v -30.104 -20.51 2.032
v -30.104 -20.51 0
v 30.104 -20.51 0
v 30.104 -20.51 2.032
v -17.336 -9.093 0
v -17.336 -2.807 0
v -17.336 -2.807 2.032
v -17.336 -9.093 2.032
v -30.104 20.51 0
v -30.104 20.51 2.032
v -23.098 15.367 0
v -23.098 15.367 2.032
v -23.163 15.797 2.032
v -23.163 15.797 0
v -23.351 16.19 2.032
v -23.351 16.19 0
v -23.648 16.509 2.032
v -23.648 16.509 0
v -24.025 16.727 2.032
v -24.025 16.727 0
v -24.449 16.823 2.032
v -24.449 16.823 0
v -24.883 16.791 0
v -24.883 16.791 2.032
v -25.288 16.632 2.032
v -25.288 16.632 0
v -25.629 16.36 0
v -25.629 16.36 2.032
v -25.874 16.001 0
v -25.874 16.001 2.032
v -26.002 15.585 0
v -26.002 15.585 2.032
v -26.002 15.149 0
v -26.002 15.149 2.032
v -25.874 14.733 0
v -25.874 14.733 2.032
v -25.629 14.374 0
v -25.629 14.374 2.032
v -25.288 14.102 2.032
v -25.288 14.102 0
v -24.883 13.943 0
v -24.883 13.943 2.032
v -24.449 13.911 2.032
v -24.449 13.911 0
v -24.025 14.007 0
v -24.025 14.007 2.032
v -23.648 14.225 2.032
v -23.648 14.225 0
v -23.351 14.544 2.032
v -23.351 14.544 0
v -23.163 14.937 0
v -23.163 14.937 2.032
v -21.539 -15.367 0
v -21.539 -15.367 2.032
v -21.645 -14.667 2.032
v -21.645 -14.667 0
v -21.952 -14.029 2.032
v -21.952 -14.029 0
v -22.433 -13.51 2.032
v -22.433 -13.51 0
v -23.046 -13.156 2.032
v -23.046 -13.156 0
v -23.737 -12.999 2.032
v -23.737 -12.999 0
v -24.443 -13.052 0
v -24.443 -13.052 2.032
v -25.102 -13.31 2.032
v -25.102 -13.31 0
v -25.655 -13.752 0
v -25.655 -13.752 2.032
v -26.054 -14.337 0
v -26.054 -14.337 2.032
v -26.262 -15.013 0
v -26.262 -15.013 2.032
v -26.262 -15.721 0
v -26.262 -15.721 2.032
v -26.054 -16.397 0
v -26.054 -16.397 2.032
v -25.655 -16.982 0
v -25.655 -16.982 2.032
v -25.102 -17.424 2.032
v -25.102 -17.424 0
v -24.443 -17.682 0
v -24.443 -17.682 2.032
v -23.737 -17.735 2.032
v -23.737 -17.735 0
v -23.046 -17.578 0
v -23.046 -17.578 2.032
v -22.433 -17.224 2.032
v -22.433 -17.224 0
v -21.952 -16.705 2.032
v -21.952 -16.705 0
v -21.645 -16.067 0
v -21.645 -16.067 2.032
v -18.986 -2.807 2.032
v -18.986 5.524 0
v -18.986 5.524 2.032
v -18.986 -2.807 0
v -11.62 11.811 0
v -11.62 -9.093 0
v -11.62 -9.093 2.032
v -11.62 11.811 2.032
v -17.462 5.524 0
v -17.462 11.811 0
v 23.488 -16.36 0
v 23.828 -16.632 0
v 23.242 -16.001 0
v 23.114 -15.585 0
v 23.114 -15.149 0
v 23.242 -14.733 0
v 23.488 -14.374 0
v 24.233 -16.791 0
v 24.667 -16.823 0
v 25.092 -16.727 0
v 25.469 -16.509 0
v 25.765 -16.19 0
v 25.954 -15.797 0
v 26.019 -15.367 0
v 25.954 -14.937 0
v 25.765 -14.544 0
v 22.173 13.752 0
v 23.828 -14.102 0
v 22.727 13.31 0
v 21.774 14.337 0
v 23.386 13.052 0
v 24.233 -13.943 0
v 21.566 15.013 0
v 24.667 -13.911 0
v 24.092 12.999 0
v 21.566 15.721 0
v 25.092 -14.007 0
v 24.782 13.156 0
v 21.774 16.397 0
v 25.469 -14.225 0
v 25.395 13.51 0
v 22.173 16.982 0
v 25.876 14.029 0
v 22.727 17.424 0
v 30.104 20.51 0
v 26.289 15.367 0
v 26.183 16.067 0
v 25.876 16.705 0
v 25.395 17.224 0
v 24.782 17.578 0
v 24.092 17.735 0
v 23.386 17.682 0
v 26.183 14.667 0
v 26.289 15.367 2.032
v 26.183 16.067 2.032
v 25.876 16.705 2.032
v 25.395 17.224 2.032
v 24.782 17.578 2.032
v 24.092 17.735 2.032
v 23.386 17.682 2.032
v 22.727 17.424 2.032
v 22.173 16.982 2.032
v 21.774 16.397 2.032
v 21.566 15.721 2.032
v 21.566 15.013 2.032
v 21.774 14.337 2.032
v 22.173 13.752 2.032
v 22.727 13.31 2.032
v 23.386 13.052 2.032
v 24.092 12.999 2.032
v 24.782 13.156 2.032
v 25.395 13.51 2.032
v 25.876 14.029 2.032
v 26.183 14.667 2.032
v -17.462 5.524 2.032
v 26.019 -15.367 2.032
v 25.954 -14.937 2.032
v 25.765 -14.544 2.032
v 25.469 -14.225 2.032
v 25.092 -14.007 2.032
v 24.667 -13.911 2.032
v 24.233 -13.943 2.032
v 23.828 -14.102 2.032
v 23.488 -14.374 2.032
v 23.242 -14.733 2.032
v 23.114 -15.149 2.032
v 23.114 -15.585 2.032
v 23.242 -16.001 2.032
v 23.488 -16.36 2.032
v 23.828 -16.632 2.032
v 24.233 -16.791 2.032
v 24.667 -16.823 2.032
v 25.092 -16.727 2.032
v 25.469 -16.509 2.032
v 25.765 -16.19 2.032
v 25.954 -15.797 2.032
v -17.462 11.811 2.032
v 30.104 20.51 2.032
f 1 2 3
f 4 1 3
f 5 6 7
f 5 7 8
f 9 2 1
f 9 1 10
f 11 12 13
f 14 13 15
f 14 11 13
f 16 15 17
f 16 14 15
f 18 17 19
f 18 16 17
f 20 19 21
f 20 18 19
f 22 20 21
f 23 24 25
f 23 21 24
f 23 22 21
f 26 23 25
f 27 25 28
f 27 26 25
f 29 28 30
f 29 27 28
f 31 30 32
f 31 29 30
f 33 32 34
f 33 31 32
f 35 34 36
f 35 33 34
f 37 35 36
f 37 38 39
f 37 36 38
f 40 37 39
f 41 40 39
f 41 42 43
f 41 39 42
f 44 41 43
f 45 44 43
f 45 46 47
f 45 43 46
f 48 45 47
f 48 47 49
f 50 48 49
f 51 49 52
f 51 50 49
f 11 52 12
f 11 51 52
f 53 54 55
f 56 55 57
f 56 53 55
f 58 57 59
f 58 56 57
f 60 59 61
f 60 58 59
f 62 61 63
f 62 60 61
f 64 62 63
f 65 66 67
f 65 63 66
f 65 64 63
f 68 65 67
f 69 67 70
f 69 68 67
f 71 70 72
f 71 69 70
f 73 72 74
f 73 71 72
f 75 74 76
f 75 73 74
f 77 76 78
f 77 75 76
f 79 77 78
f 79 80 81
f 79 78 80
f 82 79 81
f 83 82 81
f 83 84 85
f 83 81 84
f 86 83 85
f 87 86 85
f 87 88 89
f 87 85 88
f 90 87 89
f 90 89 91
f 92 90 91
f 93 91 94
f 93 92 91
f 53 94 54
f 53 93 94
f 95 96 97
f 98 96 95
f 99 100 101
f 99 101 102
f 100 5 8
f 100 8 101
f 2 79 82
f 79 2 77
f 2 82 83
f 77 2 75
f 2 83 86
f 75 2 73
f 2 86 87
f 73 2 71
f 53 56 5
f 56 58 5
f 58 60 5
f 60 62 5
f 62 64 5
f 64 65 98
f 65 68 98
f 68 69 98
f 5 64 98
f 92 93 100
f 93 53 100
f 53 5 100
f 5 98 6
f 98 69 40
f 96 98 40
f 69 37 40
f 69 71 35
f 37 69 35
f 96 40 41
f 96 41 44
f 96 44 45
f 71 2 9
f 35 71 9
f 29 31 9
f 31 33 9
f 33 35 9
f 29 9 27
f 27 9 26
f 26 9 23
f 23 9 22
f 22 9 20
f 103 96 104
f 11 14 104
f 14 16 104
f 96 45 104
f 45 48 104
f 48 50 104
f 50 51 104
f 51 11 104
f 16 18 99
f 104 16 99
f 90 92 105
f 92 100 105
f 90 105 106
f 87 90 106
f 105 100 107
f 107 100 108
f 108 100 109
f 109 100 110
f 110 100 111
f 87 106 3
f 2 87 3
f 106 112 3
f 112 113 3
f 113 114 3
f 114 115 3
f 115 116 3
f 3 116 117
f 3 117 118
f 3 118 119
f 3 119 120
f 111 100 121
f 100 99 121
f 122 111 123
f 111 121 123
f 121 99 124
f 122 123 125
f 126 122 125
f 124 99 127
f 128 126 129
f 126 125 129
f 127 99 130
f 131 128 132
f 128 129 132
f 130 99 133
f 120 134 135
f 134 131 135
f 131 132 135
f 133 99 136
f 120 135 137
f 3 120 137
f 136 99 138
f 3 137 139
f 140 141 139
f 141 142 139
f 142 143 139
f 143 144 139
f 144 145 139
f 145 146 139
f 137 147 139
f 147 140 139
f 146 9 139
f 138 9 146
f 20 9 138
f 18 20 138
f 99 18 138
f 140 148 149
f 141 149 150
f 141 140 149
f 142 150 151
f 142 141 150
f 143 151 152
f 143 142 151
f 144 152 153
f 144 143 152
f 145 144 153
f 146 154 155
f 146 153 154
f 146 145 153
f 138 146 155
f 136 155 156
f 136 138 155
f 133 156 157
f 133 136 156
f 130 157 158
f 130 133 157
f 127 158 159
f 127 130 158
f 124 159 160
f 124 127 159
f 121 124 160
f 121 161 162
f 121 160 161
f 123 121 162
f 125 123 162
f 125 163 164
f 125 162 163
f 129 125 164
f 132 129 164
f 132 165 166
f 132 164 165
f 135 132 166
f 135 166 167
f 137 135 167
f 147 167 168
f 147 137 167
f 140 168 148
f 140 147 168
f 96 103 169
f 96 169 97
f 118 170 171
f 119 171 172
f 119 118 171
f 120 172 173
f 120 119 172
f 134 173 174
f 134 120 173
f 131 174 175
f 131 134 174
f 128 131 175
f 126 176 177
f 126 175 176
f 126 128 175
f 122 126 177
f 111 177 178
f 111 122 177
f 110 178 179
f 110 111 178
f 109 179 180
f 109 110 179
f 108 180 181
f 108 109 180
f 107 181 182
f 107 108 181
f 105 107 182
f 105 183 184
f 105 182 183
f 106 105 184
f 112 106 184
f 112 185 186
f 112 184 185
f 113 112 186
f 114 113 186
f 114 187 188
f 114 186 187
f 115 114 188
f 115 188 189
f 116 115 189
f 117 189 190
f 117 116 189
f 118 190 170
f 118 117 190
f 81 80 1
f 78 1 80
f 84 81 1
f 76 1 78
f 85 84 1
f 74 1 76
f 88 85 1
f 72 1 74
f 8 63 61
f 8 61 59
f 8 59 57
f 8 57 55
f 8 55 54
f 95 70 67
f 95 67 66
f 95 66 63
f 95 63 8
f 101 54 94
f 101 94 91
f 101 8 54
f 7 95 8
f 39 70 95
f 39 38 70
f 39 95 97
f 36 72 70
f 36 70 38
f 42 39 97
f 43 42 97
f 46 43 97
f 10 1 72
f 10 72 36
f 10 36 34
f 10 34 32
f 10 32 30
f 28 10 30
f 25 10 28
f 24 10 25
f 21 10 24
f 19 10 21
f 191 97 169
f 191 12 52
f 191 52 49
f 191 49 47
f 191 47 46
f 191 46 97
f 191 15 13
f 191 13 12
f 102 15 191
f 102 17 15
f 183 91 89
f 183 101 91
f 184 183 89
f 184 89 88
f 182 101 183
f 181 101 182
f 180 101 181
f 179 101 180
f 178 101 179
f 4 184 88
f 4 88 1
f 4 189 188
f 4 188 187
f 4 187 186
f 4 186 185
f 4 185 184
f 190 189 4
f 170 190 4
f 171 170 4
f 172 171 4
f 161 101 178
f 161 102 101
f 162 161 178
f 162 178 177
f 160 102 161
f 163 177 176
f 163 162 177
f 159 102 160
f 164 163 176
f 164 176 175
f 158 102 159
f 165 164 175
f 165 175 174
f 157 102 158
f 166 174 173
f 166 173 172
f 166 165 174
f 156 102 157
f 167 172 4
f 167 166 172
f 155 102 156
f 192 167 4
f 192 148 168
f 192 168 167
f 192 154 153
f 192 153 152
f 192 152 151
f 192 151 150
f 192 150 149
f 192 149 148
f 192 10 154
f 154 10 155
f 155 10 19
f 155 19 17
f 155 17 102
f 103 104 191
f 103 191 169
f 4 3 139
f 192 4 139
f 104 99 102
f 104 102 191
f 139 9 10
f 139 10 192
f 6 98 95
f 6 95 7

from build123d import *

# Parameters (mm, degrees)
F8_W      = 60.2088514067
F8_H      = 41.021
F9_DEPTH  = 2.032
F6_R      = 2.3749
F7_R      = 2.3749
F10_DEPTH = 12.192
F3_R      = 1.4605
F5_R      = 1.4605
F11_DEPTH = 12.192
F13_DEPTH = 2.286


with BuildPart() as f9:
    # F8 (on Top) → F9 (new body)
    with BuildSketch(Plane.XY):
        Rectangle(F8_W, F8_H)
    extrude(amount=F9_DEPTH)

    # F6 (on face) + F7 (on face) → F10 (cut)
    with BuildSketch(Plane.XY):
        with Locations((-23.9141, -15.367)):
            Circle(F6_R)
    with BuildSketch(Plane.XY):
        with Locations((23.9141, 15.367)):
            Circle(F7_R)
    extrude(amount=F10_DEPTH, mode=Mode.SUBTRACT)

    # F3 (on face) + F5 (on face) → F11 (cut)
    with BuildSketch(Plane.XY):
        with Locations((-24.5581628517, 15.367)):
            Circle(F3_R)
    with BuildSketch(Plane.XY):
        with Locations((24.5581628517, -15.367)):
            Circle(F5_R)
    extrude(amount=F11_DEPTH, mode=Mode.SUBTRACT)

    # F12 (on Top) → F13 (cut)
    with BuildSketch(Plane.XY):
        Polygon((-11.6205, -9.0932), (-11.6205, 11.811), (-17.4625, 11.811), (-17.4625, 5.5245), (-18.9865, 5.5245), (-18.9865, -2.8067), (-17.3355, -2.8067), (-17.3355, -9.0932), align=None)
    extrude(amount=F13_DEPTH, mode=Mode.SUBTRACT)


solid = f9.part
